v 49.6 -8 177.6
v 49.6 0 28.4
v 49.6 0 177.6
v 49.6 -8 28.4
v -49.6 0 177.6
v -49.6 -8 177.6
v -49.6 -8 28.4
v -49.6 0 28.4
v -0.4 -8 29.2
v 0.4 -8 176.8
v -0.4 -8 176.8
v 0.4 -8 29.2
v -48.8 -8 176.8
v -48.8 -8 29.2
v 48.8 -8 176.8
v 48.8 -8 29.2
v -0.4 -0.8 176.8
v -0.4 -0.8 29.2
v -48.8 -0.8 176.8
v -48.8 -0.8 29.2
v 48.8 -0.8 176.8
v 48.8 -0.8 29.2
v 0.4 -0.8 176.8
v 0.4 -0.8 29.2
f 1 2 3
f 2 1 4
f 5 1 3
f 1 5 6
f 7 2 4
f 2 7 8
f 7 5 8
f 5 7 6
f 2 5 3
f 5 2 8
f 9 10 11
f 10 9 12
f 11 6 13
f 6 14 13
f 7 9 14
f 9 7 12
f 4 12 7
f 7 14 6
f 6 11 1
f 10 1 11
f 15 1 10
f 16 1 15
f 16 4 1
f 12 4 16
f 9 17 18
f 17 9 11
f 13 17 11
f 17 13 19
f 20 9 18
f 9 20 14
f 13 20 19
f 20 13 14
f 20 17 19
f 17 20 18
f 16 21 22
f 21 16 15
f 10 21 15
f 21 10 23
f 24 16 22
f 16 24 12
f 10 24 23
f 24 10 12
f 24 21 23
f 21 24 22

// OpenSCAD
//font="Bitstream Vera Sans Bold";
//font="Arial Black";
font="Baskerville:style=Bold";
text_on_flat="Mati";
text_size=40;
depth=40;
spacing=1;

frame_z_offset = 0.5*text_size;

frame_width=10;
frame_depth=20;
frame_cover_overlap=frame_width*0.8;
picture_overlap=frame_width-frame_cover_overlap;

picture_x=100;
picture_z=150;
picture_depth=0.5*frame_depth;

cover_spacing=0.4;
cover_wall_width=0.8;
cover_depth_multiplier=0.8;



module the_text() {
linear_extrude(height=depth, convexity=4)
    text(text_on_flat, 
         size=text_size,
         font=font,
         halign="center",
         spacing=spacing);
}

module picture_frame() {
    frame_size_x = picture_x - 2*picture_overlap + 2*frame_width;
    frame_size_z = picture_z - 2*picture_overlap + 2*frame_width;
    window_size_x = picture_x - 2*picture_overlap;
    window_size_z = picture_z - 2*picture_overlap;
    translate([-0.5*frame_size_x, 0, 0]) difference() {
        cube([frame_size_x, frame_depth, frame_size_z]);
        translate([frame_width, 0, frame_width]) cube([window_size_x, frame_depth, window_size_z]);
    }    
}

module base_frame_with_text() {
  rotate([90, 0, 0]) the_text();
  translate([0, -frame_depth, frame_z_offset]) picture_frame();
}

module picture_cut() {
  real_picture_depth=frame_depth-picture_depth;
  translate([-0.5*picture_x, -real_picture_depth, frame_z_offset+frame_width-picture_overlap]) cube([picture_x, real_picture_depth, picture_z]);
}


module the_frame() {
    difference() {
      base_frame_with_text();
      picture_cut();
    }
}

module cover() {
  real_cover_depth=cover_depth_multiplier*(frame_depth-picture_depth);
  cover_x = picture_x-2*cover_spacing;
  cover_z = picture_z-2*cover_spacing;
  cut_x = 0.5*(cover_x-3*cover_wall_width);
  cut_z = cover_z-2*cover_wall_width;
  cut_y = real_cover_depth-cover_wall_width;
  
  translate([-0.5*cover_x, -real_cover_depth, frame_z_offset+frame_width-picture_overlap+cover_spacing]) 
    difference() {
      cube([cover_x, real_cover_depth, cover_z]);
      translate([cover_wall_width, 0, cover_wall_width]) cube([cut_x, cut_y, cut_z]);
      translate([cut_x+2*cover_wall_width, 0, cover_wall_width]) cube([cut_x, cut_y, cut_z]);
    }
}


//the_frame();
cover();
